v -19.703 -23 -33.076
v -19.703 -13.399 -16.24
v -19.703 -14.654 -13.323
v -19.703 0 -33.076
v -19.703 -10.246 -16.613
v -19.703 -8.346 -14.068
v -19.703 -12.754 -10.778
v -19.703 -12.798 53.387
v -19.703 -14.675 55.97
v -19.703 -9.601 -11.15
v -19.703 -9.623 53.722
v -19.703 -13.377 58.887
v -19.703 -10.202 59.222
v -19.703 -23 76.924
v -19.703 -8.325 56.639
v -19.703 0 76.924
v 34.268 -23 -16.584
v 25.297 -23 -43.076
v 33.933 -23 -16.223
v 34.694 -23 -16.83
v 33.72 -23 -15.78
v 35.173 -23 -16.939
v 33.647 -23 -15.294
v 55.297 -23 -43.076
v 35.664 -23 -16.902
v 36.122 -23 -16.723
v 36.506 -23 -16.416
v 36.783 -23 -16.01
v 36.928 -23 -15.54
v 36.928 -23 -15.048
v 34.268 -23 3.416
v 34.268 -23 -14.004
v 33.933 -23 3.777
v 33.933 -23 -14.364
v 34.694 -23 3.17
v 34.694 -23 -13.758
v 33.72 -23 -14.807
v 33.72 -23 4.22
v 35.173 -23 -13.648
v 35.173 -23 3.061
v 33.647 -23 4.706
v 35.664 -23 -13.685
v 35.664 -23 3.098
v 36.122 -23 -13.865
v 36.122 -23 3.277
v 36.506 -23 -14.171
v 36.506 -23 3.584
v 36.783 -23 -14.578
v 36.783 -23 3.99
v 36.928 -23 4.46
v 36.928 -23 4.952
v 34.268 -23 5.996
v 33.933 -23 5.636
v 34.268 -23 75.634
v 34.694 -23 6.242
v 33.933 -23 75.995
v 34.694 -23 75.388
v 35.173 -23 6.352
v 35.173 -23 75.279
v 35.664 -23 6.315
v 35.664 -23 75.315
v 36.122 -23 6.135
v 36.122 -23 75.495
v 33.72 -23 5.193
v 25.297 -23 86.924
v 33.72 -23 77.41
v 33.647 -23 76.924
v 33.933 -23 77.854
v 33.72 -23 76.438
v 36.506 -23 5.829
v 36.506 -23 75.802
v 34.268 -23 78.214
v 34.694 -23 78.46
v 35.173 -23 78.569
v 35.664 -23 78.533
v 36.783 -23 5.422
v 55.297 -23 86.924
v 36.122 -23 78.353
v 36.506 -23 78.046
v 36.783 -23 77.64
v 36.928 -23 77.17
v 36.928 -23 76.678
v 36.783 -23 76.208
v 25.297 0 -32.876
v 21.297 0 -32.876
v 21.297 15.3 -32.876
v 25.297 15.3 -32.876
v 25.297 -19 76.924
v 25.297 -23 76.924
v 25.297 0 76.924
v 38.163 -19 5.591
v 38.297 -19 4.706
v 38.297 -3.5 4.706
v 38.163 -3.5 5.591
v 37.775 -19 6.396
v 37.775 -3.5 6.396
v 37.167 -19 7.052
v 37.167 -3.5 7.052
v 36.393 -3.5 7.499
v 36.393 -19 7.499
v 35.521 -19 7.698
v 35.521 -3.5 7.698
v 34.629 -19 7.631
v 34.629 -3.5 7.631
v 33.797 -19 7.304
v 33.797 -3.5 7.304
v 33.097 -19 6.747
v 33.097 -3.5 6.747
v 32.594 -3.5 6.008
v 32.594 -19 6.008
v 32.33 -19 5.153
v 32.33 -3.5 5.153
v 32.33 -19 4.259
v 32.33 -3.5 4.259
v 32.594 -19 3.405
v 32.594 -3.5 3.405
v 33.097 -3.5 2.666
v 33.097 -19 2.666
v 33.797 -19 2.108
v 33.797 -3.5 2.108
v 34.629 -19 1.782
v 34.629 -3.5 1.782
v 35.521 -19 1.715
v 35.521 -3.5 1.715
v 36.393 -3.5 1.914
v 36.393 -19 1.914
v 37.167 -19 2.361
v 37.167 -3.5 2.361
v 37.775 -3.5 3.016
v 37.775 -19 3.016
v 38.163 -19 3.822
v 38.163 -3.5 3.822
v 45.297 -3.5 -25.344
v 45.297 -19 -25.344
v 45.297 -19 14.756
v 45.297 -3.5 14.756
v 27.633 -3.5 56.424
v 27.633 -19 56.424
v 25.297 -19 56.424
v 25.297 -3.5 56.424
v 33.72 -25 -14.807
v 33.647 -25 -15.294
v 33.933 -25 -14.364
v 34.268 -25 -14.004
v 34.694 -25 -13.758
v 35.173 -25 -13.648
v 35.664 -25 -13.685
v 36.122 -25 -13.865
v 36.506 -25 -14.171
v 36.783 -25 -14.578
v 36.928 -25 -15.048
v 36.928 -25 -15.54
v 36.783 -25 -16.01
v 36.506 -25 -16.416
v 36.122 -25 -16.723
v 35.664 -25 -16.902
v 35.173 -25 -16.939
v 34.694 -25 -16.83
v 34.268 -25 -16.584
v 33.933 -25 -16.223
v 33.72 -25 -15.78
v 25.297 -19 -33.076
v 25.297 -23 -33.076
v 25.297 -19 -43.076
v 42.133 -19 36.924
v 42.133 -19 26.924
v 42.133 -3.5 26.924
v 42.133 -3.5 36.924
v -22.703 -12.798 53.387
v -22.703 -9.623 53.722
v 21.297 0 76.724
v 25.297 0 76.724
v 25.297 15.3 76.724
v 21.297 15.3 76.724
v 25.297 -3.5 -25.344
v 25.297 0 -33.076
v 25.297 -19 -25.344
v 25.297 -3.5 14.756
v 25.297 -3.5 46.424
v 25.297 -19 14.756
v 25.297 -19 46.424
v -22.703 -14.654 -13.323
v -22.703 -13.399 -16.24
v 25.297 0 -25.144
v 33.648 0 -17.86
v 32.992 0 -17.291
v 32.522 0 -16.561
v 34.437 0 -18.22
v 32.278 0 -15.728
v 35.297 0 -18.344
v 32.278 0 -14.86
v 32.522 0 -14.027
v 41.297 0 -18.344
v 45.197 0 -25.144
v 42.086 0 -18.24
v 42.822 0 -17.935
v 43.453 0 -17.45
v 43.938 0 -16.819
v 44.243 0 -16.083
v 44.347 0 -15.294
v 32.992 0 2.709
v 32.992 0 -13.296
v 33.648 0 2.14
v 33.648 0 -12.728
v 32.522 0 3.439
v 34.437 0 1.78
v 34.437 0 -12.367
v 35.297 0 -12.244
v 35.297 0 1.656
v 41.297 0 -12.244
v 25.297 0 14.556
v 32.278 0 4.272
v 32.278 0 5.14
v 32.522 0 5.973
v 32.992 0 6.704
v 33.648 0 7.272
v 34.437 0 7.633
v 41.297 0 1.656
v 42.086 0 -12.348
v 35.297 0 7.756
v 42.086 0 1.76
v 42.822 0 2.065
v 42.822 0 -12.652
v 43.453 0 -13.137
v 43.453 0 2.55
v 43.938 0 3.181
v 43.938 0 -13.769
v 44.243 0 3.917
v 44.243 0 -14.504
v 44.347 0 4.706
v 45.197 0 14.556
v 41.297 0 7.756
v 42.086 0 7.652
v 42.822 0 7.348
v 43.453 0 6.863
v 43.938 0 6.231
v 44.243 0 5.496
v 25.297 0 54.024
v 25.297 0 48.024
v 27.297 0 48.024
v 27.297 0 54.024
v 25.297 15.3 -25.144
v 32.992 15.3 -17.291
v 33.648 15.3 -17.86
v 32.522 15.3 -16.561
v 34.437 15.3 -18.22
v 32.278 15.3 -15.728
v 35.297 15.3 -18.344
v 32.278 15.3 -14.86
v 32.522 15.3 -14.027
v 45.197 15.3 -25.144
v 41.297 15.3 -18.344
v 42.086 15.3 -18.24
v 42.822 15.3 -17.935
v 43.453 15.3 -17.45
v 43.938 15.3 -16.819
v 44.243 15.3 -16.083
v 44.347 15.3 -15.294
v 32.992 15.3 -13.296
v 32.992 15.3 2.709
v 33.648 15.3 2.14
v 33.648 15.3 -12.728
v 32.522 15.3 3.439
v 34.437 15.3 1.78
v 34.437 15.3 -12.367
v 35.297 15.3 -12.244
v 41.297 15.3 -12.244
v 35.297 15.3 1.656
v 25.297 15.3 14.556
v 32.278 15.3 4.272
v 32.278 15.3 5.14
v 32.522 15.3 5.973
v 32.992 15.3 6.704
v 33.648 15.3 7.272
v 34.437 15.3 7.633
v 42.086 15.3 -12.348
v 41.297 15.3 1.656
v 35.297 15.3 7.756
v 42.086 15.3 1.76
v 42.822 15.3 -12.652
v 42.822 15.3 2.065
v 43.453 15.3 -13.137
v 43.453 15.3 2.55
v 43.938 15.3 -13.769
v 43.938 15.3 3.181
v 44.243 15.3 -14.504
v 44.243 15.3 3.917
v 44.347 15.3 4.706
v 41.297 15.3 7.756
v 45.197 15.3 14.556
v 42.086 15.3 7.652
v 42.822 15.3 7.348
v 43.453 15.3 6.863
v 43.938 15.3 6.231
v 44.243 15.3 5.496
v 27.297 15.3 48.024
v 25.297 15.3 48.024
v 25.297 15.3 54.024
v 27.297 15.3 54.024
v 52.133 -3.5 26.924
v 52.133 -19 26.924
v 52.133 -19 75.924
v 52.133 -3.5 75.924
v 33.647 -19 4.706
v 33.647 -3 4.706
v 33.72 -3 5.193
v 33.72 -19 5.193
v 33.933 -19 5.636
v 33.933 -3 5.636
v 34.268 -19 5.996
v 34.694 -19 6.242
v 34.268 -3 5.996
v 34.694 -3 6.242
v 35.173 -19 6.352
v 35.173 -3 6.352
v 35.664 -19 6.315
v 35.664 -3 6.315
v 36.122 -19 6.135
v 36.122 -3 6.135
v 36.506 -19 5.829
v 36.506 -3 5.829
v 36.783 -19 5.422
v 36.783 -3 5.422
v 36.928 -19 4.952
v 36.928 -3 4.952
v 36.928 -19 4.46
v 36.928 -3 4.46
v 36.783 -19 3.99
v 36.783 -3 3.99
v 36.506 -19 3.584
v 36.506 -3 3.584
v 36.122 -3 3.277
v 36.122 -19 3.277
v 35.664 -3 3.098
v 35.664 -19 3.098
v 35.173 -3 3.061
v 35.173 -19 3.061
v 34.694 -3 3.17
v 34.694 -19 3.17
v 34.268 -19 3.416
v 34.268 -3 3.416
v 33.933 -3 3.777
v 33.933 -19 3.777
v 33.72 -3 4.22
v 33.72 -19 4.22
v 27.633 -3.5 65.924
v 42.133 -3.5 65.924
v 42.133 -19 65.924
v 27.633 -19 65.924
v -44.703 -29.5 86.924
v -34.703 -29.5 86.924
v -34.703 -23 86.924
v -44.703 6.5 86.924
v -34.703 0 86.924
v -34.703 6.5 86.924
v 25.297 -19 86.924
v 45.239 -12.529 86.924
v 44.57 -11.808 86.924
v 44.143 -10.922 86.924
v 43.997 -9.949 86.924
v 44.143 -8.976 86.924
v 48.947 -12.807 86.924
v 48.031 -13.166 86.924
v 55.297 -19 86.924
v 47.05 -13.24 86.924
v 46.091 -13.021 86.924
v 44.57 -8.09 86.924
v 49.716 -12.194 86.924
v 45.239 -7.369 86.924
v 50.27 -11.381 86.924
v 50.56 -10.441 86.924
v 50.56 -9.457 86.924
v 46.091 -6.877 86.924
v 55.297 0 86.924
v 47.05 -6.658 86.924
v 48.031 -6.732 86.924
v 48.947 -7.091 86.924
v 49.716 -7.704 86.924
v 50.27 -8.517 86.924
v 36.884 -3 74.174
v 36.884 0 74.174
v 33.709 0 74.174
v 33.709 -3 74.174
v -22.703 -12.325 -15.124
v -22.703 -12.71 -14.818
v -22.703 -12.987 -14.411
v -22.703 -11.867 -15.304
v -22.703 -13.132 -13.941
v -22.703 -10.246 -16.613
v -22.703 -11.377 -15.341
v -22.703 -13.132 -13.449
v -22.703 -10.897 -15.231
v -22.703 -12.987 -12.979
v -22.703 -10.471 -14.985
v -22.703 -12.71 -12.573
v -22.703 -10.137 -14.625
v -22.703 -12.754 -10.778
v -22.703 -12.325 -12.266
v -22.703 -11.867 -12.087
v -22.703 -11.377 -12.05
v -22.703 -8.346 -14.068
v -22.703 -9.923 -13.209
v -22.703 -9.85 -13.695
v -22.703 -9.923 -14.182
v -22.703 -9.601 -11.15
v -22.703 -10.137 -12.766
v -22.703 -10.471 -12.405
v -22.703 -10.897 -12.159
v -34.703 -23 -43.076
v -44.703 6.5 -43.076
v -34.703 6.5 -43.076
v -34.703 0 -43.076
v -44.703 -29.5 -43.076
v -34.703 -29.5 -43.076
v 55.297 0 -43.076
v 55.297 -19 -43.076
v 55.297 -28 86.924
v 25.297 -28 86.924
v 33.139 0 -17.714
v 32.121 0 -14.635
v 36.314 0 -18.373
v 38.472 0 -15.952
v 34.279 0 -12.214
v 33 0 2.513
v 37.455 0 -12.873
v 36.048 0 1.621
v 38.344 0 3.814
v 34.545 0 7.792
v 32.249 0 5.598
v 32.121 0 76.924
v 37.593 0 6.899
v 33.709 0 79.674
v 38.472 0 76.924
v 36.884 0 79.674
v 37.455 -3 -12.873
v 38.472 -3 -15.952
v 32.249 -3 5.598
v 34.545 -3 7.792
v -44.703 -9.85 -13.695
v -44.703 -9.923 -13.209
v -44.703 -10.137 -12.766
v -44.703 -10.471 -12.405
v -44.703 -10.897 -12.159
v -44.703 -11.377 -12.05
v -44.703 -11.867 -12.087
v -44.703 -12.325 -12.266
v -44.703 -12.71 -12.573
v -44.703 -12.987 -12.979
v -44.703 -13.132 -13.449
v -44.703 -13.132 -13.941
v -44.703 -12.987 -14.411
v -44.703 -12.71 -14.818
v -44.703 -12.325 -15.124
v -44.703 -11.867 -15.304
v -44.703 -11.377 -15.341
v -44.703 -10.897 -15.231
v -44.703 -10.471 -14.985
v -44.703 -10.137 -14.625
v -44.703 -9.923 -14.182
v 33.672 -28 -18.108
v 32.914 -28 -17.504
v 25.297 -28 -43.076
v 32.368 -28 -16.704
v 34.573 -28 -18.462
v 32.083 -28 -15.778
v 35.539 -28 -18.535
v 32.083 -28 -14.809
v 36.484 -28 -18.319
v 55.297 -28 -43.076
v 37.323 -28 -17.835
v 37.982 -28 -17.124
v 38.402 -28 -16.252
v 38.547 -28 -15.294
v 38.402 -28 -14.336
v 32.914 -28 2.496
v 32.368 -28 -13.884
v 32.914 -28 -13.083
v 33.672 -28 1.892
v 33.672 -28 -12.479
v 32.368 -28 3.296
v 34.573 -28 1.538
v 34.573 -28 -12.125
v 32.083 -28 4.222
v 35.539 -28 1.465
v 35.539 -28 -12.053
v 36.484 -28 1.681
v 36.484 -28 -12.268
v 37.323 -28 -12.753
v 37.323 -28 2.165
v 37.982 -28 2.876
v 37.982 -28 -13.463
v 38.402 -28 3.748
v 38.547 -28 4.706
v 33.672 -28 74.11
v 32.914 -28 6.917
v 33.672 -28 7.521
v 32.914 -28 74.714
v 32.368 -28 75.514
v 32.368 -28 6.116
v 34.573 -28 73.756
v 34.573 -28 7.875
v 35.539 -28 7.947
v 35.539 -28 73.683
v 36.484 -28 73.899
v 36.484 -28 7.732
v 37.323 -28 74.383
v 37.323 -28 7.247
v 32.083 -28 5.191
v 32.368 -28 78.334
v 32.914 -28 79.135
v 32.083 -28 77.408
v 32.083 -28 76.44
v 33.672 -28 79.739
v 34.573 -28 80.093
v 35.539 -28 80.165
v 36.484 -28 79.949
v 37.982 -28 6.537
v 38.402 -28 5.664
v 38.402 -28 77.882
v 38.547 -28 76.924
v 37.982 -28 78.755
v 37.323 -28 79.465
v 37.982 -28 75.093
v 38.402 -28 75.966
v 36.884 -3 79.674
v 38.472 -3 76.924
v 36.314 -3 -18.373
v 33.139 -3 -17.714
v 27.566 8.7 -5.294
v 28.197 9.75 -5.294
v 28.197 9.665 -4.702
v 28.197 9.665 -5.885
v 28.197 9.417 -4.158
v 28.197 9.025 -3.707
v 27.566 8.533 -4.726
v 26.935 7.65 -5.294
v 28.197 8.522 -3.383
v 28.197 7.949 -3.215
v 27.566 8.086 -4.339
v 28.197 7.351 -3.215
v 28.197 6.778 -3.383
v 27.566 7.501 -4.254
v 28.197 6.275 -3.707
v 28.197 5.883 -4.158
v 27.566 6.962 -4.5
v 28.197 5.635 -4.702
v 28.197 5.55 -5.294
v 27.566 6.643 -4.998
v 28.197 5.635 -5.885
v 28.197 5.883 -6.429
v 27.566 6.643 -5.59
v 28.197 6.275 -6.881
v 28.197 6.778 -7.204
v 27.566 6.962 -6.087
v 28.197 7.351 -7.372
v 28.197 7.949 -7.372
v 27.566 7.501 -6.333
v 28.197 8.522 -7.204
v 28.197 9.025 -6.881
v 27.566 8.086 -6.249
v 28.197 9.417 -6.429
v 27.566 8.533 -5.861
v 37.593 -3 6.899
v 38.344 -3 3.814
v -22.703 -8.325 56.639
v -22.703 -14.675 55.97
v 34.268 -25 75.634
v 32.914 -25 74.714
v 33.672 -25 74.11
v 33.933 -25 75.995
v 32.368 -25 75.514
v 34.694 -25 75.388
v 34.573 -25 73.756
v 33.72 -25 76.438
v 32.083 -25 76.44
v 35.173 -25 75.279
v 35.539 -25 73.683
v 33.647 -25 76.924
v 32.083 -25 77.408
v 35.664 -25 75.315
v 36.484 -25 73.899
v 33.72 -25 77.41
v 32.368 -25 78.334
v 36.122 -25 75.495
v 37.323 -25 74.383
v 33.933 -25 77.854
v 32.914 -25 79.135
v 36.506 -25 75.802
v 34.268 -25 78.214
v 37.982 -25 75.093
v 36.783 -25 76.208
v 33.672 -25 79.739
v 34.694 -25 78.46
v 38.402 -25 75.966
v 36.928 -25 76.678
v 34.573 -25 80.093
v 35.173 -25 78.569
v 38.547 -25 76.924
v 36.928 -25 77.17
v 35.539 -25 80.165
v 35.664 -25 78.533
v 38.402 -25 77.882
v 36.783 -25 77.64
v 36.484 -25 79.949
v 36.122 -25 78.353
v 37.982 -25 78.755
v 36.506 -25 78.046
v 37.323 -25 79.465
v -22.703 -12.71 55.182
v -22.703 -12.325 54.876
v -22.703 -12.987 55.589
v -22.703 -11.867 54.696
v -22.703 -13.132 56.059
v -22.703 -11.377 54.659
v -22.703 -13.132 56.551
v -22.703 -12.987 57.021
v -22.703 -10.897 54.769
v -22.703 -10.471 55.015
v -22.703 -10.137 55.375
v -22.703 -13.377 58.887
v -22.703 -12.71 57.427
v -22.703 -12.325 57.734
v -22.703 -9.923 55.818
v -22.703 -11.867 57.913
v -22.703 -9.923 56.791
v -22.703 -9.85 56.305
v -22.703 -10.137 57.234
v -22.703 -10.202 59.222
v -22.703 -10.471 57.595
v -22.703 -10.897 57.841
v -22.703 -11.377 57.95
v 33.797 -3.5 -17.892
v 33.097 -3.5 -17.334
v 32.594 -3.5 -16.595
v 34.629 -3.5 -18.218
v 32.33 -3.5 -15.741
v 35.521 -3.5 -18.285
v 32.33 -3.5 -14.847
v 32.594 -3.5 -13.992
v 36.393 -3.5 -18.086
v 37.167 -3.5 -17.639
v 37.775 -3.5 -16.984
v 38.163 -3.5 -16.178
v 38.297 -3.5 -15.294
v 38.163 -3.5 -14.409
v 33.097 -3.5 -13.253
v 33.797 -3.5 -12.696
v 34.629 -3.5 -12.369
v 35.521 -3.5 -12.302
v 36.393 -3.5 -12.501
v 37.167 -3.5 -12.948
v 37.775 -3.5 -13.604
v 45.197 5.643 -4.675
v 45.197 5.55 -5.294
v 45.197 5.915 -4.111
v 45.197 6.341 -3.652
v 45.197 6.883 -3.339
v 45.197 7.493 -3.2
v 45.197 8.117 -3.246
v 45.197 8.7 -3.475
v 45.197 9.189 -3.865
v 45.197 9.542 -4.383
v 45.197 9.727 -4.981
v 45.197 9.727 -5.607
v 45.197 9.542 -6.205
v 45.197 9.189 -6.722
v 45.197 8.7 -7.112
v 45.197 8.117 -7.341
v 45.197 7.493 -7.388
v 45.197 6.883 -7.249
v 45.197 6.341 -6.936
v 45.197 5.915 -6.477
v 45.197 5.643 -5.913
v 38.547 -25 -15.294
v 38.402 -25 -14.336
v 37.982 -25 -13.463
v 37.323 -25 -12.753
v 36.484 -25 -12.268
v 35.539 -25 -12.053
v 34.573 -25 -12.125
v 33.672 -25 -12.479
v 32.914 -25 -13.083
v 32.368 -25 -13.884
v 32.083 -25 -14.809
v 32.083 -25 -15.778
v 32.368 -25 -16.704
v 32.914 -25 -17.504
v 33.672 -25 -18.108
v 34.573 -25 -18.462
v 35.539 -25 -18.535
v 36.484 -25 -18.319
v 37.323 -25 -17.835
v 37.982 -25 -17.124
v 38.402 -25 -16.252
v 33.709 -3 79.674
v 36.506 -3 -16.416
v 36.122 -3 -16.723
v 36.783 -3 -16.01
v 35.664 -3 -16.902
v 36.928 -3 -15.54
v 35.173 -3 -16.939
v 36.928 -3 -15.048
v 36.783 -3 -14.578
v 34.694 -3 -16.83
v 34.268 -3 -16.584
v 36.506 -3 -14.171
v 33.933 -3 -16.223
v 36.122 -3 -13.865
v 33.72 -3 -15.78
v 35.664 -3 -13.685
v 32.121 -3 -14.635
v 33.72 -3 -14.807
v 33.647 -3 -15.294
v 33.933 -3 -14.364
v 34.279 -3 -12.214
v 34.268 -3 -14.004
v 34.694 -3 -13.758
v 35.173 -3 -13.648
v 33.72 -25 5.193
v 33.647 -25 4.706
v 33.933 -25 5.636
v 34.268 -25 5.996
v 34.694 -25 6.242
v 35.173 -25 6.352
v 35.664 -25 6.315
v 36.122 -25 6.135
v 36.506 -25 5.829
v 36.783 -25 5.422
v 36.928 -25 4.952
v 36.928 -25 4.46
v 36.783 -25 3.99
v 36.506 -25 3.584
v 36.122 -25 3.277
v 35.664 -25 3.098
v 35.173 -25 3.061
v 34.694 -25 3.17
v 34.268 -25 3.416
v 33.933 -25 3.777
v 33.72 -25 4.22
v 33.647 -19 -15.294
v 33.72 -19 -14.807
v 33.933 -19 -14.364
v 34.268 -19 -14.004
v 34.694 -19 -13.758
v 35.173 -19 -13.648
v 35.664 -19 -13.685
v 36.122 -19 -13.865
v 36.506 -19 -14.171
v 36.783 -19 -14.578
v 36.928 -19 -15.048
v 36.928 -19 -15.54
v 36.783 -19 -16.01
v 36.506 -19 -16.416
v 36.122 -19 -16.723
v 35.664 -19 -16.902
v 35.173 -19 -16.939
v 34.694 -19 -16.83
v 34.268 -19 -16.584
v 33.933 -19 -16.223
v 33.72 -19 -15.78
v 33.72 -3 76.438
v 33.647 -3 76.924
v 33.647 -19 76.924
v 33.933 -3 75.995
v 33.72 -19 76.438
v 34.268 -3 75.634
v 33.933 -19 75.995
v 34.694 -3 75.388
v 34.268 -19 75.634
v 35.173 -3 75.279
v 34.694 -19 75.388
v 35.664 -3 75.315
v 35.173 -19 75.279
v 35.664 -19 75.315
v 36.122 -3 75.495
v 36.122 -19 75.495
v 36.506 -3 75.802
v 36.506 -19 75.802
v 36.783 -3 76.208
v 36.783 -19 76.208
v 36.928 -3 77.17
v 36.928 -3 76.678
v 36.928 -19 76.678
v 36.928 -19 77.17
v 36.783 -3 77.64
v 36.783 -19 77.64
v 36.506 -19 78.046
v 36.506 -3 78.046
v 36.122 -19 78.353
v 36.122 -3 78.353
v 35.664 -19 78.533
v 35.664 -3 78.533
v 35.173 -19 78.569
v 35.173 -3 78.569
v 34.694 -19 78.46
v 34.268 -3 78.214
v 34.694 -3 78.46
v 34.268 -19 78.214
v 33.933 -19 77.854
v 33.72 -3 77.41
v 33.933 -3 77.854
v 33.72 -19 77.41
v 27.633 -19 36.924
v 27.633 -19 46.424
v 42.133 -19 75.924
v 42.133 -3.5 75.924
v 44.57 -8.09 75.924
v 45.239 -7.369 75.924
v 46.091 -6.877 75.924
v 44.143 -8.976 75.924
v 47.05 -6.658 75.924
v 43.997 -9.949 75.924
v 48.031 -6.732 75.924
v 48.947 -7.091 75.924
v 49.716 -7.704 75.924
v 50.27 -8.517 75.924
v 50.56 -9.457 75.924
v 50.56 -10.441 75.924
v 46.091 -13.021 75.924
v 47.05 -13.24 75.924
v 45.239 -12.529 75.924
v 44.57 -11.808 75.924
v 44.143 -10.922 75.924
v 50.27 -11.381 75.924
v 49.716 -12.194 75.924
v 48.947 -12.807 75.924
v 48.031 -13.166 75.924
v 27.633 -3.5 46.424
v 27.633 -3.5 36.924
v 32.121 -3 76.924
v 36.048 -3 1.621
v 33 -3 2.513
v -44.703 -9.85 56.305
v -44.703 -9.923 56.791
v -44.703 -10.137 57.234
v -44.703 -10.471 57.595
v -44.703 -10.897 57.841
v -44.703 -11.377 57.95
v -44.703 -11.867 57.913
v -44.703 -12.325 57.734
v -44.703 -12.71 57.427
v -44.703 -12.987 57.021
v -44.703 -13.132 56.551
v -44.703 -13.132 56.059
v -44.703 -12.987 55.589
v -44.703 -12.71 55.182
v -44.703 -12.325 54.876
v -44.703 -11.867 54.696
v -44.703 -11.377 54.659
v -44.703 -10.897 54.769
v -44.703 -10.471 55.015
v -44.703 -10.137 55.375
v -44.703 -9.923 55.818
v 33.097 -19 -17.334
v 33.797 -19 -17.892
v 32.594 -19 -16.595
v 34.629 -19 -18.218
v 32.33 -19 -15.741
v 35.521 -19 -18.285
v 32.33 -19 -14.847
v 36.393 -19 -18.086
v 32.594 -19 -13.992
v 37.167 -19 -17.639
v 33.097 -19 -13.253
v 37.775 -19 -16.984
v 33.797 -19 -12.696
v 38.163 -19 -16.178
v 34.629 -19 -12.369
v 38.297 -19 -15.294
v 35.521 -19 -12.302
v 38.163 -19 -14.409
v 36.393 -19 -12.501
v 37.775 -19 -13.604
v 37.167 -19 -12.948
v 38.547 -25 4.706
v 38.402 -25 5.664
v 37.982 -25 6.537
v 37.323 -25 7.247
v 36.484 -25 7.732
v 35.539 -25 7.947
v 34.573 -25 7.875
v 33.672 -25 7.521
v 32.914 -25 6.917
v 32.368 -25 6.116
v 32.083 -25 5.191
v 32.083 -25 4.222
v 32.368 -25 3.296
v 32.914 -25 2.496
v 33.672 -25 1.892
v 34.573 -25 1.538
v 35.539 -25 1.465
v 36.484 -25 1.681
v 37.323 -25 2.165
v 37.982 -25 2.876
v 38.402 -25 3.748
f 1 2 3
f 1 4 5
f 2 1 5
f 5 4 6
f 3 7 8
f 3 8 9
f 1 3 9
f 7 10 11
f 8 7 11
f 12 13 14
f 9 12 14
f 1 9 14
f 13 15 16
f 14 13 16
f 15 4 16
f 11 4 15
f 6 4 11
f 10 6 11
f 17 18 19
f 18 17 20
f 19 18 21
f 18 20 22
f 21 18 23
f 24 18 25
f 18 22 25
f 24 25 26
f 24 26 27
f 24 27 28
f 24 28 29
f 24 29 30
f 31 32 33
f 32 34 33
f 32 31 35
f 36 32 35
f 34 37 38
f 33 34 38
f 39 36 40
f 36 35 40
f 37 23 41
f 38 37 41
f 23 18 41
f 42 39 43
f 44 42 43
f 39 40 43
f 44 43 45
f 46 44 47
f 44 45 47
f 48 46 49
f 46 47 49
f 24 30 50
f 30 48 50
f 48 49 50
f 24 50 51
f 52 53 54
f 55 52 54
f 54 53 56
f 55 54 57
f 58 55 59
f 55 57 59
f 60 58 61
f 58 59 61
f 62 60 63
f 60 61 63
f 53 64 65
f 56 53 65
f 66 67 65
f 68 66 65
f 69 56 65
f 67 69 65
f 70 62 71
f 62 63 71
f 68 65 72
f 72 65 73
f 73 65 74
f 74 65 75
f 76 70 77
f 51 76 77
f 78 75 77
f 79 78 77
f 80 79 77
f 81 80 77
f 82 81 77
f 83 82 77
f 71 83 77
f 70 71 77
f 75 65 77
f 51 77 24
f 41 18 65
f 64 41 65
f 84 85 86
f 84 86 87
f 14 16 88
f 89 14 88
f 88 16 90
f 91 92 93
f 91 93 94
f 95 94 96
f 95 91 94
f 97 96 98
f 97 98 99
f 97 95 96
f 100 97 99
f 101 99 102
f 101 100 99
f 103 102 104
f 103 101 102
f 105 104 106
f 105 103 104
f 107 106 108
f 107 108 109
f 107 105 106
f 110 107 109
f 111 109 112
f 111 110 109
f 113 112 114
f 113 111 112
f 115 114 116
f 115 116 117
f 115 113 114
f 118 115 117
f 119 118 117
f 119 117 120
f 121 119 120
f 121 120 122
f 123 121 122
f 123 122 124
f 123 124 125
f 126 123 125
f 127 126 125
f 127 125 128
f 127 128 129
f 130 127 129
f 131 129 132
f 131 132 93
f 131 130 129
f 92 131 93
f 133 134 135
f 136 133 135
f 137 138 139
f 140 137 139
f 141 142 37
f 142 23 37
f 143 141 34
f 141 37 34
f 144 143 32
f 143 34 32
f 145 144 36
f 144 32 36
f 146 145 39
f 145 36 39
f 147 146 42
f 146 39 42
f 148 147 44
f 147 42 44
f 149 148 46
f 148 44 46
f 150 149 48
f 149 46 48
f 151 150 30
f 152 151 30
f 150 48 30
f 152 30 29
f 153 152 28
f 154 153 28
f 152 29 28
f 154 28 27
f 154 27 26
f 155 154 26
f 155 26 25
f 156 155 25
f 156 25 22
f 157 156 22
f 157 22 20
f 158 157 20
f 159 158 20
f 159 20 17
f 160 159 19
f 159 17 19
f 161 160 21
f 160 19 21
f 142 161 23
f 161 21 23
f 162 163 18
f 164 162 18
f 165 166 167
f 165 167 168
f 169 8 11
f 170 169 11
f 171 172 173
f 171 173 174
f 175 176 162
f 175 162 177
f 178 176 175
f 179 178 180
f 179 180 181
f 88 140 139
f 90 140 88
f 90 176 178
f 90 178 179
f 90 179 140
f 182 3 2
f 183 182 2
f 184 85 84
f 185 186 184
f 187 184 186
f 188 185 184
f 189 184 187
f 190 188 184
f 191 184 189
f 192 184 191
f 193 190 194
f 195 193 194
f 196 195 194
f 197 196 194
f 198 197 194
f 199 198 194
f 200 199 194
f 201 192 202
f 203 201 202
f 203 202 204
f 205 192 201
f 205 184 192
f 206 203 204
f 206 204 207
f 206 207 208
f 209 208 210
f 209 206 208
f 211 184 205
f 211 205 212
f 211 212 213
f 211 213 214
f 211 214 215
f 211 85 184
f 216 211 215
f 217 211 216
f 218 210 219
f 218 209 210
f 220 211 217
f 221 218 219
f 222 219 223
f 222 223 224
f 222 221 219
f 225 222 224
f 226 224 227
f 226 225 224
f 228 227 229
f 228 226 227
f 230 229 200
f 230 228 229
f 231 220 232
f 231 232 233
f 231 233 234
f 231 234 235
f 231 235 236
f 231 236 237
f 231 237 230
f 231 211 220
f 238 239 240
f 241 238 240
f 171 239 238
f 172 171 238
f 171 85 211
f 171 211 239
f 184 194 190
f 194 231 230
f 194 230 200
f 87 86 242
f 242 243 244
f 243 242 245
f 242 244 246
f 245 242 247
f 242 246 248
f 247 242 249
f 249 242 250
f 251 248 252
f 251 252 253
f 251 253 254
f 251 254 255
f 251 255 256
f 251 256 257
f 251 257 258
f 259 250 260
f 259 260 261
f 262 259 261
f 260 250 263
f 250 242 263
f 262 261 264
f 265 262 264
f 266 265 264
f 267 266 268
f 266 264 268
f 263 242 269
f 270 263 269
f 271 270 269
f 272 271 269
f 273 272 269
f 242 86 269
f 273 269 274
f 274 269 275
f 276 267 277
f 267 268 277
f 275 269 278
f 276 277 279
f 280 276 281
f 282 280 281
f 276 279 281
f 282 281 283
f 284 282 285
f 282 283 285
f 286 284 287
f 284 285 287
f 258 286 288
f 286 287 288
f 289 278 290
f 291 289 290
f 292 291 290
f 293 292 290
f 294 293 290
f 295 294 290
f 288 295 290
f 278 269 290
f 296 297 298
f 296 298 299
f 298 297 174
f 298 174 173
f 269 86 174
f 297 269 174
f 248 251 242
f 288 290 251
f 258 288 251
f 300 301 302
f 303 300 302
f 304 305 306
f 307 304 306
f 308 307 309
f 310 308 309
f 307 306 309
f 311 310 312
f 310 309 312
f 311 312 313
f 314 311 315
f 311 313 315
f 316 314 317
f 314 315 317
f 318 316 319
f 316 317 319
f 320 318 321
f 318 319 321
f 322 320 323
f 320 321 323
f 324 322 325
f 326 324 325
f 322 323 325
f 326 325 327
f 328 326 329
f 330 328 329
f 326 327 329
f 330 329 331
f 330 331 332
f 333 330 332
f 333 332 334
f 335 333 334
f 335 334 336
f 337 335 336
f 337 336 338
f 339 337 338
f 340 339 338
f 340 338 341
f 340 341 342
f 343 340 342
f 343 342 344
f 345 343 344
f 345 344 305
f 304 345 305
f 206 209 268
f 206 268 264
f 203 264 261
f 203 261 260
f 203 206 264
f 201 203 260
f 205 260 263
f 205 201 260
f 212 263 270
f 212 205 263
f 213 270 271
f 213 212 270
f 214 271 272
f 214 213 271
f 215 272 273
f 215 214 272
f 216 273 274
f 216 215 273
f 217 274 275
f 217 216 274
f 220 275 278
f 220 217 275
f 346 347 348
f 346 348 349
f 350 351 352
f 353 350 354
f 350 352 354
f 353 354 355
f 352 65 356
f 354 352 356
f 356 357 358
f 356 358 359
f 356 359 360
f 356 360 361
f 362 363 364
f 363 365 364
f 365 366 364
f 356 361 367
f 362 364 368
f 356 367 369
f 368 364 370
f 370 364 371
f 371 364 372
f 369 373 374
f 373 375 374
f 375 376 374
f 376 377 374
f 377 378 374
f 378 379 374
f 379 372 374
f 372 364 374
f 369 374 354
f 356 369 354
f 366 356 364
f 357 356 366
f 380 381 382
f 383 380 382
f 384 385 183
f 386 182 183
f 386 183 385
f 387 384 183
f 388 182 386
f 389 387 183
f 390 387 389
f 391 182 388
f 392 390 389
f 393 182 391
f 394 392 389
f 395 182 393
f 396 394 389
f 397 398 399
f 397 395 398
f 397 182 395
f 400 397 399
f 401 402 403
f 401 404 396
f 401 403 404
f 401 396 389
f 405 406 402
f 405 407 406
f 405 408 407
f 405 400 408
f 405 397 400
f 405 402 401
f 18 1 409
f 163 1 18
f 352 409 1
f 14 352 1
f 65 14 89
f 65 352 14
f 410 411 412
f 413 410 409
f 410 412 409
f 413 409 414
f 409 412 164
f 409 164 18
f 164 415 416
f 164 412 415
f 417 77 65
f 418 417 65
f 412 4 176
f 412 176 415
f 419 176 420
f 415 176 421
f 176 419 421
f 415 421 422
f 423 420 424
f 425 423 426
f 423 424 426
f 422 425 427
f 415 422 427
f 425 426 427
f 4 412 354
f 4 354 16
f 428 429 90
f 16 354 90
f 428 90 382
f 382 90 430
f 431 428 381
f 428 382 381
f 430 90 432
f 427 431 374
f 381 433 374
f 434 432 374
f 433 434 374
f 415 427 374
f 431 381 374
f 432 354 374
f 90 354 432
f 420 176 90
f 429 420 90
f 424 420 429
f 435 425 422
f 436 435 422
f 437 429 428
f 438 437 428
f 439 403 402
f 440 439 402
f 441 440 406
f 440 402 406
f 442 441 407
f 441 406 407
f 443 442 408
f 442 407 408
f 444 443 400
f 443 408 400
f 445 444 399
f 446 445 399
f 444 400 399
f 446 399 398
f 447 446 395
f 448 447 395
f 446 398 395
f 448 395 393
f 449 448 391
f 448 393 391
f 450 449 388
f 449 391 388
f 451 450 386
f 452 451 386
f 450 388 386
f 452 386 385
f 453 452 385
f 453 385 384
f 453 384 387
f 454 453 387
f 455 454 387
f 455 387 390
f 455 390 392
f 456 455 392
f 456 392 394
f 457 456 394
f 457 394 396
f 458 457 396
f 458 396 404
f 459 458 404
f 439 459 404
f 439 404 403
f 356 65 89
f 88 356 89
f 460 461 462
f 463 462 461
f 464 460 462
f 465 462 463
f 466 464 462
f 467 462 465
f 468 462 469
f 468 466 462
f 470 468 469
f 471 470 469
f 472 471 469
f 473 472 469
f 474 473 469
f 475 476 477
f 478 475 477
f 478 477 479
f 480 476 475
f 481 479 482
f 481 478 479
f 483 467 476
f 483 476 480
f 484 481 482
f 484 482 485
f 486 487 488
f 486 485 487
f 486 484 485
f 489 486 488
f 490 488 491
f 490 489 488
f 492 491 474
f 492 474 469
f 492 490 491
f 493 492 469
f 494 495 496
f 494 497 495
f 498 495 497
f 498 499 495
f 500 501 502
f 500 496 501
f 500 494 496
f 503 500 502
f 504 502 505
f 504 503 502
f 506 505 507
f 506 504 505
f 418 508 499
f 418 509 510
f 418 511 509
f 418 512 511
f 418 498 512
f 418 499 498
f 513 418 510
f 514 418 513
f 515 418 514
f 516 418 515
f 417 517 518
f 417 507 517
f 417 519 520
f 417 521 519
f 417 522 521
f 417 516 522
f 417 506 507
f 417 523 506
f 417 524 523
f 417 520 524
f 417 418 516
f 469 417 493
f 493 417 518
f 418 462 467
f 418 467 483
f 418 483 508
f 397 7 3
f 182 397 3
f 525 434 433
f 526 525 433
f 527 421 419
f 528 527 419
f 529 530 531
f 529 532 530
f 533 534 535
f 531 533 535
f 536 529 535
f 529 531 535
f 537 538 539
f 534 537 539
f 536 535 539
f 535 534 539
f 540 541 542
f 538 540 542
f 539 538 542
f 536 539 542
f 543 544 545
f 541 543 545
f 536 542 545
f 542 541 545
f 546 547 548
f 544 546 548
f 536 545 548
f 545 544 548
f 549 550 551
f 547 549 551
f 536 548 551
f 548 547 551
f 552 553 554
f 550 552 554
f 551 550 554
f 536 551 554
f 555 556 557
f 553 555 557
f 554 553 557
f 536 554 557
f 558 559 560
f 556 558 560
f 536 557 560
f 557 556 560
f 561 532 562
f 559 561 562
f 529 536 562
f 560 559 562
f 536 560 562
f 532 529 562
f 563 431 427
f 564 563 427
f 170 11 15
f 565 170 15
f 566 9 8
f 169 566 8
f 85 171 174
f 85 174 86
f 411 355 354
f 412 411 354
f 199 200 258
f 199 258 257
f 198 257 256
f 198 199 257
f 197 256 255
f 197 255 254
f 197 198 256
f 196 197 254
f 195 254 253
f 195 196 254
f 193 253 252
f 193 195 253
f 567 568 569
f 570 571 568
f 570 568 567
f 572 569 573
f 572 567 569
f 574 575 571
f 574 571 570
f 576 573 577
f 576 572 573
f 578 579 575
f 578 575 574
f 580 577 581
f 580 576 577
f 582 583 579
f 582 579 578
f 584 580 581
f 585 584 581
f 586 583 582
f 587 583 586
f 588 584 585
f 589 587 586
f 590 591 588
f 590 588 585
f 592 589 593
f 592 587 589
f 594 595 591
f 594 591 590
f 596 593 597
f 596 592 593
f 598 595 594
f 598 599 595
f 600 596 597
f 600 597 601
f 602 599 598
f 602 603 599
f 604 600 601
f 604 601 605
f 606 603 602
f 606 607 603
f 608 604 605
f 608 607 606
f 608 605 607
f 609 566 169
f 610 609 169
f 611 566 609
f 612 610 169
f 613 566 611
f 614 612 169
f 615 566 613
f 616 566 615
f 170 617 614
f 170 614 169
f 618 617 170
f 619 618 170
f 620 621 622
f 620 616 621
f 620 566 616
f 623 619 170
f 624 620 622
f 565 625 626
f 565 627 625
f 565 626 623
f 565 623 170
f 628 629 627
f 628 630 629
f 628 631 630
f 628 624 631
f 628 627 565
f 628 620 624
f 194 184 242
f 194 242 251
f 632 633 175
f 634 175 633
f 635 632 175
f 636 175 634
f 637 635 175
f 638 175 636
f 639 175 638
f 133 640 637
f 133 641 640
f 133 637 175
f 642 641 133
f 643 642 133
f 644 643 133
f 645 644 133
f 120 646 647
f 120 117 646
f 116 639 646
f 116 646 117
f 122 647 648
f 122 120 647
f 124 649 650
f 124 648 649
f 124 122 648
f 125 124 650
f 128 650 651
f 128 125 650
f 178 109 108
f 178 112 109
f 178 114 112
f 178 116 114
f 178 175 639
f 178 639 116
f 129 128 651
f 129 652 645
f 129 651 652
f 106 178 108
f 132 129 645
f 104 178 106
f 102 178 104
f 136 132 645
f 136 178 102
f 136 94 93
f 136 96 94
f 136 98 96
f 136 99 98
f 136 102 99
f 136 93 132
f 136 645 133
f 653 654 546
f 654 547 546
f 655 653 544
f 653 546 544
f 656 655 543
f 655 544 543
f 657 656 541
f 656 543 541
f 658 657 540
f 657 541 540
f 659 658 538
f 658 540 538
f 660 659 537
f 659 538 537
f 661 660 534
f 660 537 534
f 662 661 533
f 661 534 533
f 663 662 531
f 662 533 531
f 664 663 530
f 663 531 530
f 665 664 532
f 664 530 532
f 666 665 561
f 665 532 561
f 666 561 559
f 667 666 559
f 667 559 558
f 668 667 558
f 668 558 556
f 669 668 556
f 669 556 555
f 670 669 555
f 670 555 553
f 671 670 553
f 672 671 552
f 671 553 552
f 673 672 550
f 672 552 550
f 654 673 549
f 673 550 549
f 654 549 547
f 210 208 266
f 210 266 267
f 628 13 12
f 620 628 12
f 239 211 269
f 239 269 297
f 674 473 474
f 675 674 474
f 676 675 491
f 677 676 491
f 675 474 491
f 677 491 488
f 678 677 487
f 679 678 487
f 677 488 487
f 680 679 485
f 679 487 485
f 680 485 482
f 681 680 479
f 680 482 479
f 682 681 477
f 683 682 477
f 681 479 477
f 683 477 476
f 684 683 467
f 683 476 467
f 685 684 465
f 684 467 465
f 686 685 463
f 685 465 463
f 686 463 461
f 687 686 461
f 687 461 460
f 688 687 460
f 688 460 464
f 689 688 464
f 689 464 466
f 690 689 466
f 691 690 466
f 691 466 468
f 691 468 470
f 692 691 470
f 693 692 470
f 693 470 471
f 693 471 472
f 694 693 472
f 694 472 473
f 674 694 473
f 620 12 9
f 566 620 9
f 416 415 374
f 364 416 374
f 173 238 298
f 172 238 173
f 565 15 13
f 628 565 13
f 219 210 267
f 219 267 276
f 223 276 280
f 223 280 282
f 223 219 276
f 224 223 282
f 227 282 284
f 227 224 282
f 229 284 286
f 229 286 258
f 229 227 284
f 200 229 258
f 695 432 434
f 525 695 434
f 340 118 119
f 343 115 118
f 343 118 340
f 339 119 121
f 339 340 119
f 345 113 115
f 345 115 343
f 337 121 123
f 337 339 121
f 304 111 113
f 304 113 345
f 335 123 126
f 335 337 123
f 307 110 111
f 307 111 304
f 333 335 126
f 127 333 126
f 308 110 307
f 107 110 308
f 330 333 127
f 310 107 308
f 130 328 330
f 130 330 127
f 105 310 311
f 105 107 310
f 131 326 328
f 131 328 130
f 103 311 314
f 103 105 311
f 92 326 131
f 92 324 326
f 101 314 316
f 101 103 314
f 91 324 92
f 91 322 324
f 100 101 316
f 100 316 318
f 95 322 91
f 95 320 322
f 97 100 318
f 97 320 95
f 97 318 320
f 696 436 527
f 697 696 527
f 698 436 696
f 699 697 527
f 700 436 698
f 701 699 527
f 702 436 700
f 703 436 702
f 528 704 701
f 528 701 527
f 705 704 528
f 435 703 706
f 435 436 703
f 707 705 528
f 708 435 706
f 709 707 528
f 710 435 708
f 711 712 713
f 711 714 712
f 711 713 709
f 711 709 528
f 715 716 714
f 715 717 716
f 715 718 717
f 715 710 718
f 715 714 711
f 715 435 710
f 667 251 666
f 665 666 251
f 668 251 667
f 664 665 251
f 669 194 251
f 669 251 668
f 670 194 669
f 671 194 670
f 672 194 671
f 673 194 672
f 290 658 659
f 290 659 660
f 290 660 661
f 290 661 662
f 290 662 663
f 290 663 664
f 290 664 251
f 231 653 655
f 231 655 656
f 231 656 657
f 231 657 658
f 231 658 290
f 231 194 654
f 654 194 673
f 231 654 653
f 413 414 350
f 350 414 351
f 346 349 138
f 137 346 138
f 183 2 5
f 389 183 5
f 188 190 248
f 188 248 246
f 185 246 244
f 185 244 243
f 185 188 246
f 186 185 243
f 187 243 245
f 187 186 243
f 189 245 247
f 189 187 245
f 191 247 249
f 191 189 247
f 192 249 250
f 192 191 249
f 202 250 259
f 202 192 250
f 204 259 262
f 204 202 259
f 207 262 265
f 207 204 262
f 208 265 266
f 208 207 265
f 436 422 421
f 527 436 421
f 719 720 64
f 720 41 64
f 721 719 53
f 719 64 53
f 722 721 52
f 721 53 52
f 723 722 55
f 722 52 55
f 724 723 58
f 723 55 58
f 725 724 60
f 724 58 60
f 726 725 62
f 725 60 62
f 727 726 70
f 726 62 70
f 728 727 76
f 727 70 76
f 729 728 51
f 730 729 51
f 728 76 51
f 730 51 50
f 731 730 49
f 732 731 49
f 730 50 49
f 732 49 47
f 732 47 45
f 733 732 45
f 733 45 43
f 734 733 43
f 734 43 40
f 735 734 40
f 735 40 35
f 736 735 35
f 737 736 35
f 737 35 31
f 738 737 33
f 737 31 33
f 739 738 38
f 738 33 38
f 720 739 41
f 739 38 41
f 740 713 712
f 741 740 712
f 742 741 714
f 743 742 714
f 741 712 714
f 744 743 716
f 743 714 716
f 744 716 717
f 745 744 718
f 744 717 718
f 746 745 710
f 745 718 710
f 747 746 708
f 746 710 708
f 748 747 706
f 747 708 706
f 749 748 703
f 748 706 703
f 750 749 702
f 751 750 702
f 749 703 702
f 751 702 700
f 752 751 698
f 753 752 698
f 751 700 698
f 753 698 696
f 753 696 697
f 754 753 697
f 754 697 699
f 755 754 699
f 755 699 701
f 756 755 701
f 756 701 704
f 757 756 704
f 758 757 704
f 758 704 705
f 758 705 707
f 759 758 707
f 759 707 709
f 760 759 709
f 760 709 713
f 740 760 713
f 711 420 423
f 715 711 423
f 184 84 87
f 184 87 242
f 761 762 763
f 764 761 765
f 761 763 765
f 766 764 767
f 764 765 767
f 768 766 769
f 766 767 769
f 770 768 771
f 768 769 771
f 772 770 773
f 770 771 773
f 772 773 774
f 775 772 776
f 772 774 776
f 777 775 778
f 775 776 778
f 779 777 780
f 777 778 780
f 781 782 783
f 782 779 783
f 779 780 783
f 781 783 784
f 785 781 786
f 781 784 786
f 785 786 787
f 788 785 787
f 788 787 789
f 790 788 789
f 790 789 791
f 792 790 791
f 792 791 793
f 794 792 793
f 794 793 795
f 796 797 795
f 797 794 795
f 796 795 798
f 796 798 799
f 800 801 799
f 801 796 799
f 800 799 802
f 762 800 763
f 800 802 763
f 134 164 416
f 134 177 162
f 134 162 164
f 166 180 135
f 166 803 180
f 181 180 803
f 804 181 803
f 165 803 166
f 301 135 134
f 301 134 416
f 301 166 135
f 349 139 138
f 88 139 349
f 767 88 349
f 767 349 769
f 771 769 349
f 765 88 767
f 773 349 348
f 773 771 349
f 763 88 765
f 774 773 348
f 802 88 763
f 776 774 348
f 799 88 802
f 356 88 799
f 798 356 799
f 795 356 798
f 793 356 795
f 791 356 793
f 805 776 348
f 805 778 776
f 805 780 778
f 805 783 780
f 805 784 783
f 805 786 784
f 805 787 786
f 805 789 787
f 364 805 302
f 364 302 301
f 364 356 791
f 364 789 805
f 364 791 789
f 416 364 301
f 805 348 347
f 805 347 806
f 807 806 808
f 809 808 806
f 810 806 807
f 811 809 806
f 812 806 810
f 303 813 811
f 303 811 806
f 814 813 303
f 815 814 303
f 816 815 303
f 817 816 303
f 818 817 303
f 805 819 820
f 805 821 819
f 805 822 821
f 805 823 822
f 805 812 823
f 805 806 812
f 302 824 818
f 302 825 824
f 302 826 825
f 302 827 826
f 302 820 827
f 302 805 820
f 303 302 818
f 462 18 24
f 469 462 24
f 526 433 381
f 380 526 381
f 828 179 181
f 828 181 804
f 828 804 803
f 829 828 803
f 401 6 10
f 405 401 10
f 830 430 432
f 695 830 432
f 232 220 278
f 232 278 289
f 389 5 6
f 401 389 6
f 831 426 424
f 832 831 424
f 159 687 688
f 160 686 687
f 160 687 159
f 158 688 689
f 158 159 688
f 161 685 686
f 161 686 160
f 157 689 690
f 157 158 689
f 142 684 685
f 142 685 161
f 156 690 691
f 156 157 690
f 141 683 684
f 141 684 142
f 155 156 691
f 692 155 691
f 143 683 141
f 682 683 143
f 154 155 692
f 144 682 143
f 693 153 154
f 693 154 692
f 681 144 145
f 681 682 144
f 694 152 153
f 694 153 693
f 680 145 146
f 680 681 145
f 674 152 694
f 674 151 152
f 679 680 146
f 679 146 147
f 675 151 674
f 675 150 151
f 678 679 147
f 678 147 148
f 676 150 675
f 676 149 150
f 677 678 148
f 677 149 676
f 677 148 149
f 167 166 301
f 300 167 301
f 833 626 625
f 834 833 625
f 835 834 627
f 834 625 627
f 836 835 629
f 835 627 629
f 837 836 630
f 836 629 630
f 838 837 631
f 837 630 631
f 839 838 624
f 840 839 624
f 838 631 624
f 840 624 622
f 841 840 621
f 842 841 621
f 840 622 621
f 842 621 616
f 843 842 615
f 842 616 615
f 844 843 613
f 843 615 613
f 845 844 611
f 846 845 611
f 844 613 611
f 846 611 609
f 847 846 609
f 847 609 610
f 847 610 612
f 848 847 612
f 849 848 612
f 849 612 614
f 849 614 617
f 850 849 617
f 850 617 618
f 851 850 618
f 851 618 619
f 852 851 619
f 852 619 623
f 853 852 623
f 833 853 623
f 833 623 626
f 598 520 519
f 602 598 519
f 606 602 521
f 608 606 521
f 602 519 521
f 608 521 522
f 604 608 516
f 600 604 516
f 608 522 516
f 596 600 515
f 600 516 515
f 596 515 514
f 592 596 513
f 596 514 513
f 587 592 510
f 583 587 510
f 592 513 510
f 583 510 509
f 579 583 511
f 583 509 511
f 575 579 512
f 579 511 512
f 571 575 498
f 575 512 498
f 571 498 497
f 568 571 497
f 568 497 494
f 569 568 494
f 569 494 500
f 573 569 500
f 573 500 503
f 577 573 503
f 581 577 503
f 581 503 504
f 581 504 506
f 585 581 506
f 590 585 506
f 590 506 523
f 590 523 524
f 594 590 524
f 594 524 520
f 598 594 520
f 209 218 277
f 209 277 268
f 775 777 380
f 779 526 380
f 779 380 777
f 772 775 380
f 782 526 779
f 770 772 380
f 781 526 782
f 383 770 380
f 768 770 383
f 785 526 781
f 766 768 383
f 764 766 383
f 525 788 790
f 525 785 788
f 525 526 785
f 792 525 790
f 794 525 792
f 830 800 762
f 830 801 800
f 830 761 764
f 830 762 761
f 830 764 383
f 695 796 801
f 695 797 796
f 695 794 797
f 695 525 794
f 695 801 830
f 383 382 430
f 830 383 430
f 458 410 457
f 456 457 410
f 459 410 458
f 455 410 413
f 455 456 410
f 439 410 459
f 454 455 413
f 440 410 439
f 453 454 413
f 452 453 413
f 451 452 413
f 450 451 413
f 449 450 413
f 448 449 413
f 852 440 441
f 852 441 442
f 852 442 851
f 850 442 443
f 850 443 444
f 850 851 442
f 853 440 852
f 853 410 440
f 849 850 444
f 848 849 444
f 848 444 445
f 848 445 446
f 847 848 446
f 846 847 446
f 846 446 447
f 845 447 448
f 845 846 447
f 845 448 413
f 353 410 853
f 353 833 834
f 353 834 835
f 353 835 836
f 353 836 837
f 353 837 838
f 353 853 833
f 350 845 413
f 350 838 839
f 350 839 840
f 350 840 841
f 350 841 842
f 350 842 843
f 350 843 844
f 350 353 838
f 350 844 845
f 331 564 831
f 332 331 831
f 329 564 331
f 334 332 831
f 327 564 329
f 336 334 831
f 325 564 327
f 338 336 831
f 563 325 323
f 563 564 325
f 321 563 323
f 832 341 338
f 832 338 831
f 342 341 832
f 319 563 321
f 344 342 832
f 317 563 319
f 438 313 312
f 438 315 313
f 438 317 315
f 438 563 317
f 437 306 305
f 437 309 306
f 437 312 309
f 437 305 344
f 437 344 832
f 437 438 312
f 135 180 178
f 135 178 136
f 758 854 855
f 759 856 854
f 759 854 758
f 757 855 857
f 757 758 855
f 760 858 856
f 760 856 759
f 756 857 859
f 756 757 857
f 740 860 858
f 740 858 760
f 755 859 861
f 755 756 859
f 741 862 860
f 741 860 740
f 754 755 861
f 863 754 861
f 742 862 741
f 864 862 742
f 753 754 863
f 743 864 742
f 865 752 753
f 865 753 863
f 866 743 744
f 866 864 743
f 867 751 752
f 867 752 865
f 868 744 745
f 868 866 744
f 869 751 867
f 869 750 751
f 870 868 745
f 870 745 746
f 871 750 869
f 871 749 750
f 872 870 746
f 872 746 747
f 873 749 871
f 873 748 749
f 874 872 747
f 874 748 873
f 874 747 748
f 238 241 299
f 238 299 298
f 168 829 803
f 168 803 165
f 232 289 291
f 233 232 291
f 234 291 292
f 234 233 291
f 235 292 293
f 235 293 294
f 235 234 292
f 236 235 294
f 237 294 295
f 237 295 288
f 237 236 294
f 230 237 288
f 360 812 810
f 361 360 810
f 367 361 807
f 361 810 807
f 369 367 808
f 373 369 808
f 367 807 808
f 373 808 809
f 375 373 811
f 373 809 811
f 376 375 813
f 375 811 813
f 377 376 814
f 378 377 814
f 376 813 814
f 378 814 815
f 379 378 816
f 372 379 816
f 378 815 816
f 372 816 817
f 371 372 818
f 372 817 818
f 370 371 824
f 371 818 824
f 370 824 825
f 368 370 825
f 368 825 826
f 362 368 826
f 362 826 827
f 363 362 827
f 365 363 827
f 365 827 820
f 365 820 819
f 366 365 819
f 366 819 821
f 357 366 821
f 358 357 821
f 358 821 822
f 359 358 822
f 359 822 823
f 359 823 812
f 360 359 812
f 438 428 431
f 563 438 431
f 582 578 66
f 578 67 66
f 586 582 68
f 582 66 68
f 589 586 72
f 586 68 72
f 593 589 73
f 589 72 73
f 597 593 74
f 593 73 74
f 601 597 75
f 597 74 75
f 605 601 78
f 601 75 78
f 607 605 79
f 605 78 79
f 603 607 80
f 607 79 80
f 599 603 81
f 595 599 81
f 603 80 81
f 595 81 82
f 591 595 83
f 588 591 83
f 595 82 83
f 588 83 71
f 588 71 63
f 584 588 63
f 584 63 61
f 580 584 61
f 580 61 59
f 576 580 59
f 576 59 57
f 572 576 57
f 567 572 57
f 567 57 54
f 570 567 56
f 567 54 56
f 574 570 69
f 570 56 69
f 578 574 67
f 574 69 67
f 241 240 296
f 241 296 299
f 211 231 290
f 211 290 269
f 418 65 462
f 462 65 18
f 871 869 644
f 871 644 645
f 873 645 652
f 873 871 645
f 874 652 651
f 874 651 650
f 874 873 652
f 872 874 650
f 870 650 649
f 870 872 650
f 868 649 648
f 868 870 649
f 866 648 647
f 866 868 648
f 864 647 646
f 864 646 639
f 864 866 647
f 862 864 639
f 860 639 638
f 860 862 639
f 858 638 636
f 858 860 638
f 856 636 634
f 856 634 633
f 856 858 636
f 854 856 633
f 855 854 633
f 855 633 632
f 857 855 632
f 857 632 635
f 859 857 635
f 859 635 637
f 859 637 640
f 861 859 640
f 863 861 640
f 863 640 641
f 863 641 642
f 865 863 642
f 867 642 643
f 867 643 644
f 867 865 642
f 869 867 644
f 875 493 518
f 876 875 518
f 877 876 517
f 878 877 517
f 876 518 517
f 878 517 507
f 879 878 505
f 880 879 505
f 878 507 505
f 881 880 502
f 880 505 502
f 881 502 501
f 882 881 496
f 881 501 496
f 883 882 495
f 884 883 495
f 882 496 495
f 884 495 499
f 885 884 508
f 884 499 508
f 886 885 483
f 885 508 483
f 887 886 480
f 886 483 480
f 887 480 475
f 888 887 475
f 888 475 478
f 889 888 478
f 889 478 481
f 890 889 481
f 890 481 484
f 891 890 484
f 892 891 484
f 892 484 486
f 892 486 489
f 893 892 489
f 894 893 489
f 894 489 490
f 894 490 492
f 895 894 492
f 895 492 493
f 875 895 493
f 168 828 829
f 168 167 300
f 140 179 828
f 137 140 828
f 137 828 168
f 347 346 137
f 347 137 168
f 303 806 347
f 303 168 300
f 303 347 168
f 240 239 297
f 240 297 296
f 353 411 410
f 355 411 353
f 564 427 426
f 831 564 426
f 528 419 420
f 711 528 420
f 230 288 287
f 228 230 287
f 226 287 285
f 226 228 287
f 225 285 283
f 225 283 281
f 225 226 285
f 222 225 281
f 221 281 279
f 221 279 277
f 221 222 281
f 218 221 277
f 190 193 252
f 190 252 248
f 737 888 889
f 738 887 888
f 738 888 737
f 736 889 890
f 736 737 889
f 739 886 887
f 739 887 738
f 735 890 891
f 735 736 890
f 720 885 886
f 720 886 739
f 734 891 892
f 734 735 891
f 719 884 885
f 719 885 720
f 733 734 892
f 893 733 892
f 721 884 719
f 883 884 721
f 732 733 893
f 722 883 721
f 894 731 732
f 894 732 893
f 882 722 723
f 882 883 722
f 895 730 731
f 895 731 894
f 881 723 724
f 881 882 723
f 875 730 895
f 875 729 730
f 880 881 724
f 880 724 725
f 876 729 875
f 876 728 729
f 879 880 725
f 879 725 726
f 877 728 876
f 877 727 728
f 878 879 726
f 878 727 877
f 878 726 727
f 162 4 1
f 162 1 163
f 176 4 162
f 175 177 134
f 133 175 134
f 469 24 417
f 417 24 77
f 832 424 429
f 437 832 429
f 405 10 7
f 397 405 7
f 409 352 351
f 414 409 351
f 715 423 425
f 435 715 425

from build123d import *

# Parameters (mm, degrees)
F0_W            = 90
F0_H            = 130
F0_W_2          = 45
F0_H_2          = 110
F1_DEPTH        = 23
F2_W            = 6.5
F2_H            = 130
F2_W_2          = 23
F3_DEPTH        = 10
F5_DEPTH        = 4
F6_W            = 5.5
F6_H            = 10
F6_W_2          = 3.1640307605
F6_W_3          = 2.3359692395
F6_W_4          = 10
F6_W_5          = 20
F6_H_2          = 40.1
F6_R            = 3
F7_DEPTH        = 15.5
F9_D            = 3.3
F9_DEPTH        = 40
F9_TIP          = 0.9914200214
F10_D           = 3.3
F10_DEPTH       = 40
F10_TIP         = 0.9914200214
F12_D           = 3.3
F12_DEPTH       = 40
F12_TIP         = 0.9914200214
F14_DEPTH       = 15.3
F15_DEPTH       = 5
F17_D           = 3.3
F17_DEPTH       = 40
F17_CBORE_D     = 6.5
F17_CBORE_DEPTH = 3
F17_TIP         = 0.9914200214
F19_D           = 6.6
F19_DEPTH       = 20
F19_TIP         = 1.9828400428
F20_R           = 1.65
F21_DEPTH       = 3
F22_R           = 1.65
F23_DEPTH       = 3
F25_D           = 4.2
F25_DEPTH       = 17
F25_TIP         = 1.2618073


with BuildPart() as f1:
    # F0 (on Front) → F1 (new body)
    with BuildSketch(Plane.XZ):
        with Locations((10.2966074646, 21.924110651)):
            Rectangle(F0_W, F0_H)
        with Locations((2.7966074646, 21.924110651)):
            Rectangle(F0_W_2, F0_H_2, mode=Mode.SUBTRACT)
    extrude(amount=F1_DEPTH)

    # F2 (on face) → F3 (join)
    with BuildSketch(Plane(origin=(-34.7033925354, 0, 0), x_dir=(0, -1, 0), z_dir=(-1, 0, 0))):
        with Locations((-3.25, 21.924110651)):
            Rectangle(F2_W, F2_H)
        with Locations((11.5, 21.924110651)):
            Rectangle(F2_W_2, F2_H)
        with Locations((26.25, 21.924110651)):
            Rectangle(F2_W, F2_H)
    extrude(amount=F3_DEPTH)

    # F4 (on face) → F5 (cut)
    with BuildSketch(Plane.XZ.offset(23)):
        Polygon((55.2966074646, -43.075889349), (55.2966074646, 86.924110651), (25.2966074646, 86.924110651), (25.2966074646, 76.924110651), (25.2966074646, -33.075889349), (25.2966074646, -43.075889349), align=None)
    extrude(amount=-F5_DEPTH, mode=Mode.SUBTRACT)

    # F6 (on face) → F7 (cut)
    with BuildSketch(Plane.XZ.offset(19)):
        Polygon((42.132576704, 65.924110651), (27.632576704, 65.924110651), (27.632576704, 56.424110651), (33.132576704, 56.424110651), (33.132576704, 46.424110651), (27.632576704, 46.424110651), (27.632576704, 36.924110651), (42.132576704, 36.924110651), (52.132576704, 36.924110651), (52.132576704, 65.924110651), align=None)
        with Locations((30.382576704, 51.424110651)):
            Rectangle(F6_W, F6_H)
        with Locations((23.7145920843, 51.424110651)):
            Rectangle(F6_W_2, F6_H)
        with Locations((26.4645920843, 51.424110651)):
            Rectangle(F6_W_3, F6_H)
        with Locations((47.132576704, 70.924110651)):
            Rectangle(F6_W_4, F6_H)
        with Locations((47.132576704, 31.924110651)):
            Rectangle(F6_W_4, F6_H)
        with Locations((35.2966074646, -5.2936900675)):
            Rectangle(F6_W_5, F6_H_2)
        with Locations((35.2966074646, -15.2936900675)):
            Circle(F6_R, mode=Mode.SUBTRACT)
        with Locations((35.2966074646, 4.7063099325)):
            Circle(F6_R, mode=Mode.SUBTRACT)
    extrude(amount=-F7_DEPTH, mode=Mode.SUBTRACT)

    # F9
    with Locations(Plane.XZ.offset(19)):
        with Locations((35.2966074646, 4.7063099325), (35.2966074646, -15.2936900675)):
            Hole(F9_D / 2, depth=F9_DEPTH)
            with Locations((0, 0, -(F9_DEPTH + F9_TIP / 2))):  # 118° drill point
                Cone(0, F9_D / 2, F9_TIP, mode=Mode.SUBTRACT)

    # F10
    with Locations(Plane(origin=(0, 0, 0), x_dir=(1, 0, 0), z_dir=(0, 1, 0))):
        with Locations((35.2966074646, -76.924110651)):
            Hole(F10_D / 2, depth=F10_DEPTH)
            with Locations((0, 0, -(F10_DEPTH + F10_TIP / 2))):  # 118° drill point
                Cone(0, F10_D / 2, F10_TIP, mode=Mode.SUBTRACT)

    # F12 (one way)
    with BuildSketch(Plane.YZ.offset(-19.7033925354)):
        with Locations((-11.5, 56.3046197238), (-11.5, -13.6953802762)):
            Circle(F12_D / 2)
    extrude(amount=-F12_DEPTH, mode=Mode.SUBTRACT)
    with Locations(Plane.YZ.offset(-19.7033925354)):
        with Locations((-11.5, 56.3046197238), (-11.5, -13.6953802762)):
            with Locations((0, 0, -(F12_DEPTH + F12_TIP / 2))):  # 118° drill point
                Cone(0, F12_D / 2, F12_TIP, mode=Mode.SUBTRACT)

    # F19
    with Locations(Plane.XY.offset(86.924110651)):
        with Locations((47.2966074646, -9.9490452558)):
            Hole(F19_D / 2, depth=F19_DEPTH)
            with Locations((0, 0, -(F19_DEPTH + F19_TIP / 2))):  # 118° drill point
                Cone(0, F19_D / 2, F19_TIP, mode=Mode.SUBTRACT)

    # F20 (on face) → F21 (cut)
    with BuildSketch(Plane(origin=(0, 0, 0), x_dir=(-1, 0, 0), z_dir=(0, 1, 0))):
        Polygon((-32.2490729675, 5.5984236151), (-34.5454333283, 7.7916090671), (-37.5929678253, 6.8994953845), (-38.3441419616, 3.8141962498), (-36.0477816008, 1.6210107978), (-33.0002471038, 2.5131244805), align=None)
        with Locations((-35.2966074646, 4.7063099325)):
            Circle(F20_R, mode=Mode.SUBTRACT)
        Polygon((-32.121180984, -14.6351313678), (-34.2792227881, -12.2144107177), (-37.4546492687, -12.8729694174), (-38.4720339451, -15.9522487673), (-36.313992141, -18.3729694174), (-33.1385656604, -17.7144107177), align=None)
        with Locations((-35.2966074646, -15.2936900675)):
            Circle(F20_R, mode=Mode.SUBTRACT)
        Polygon((-36.8843207048, 74.174110651), (-33.7088942243, 74.174110651), (-32.121180984, 76.924110651), (-33.7088942243, 79.674110651), (-36.8843207048, 79.674110651), (-38.4720339451, 76.924110651), align=None)
        with Locations((-35.2966074646, 76.924110651)):
            Circle(F20_R, mode=Mode.SUBTRACT)
    extrude(amount=-F21_DEPTH, mode=Mode.SUBTRACT)

    # F22 (on face) → F23 (cut)
    with BuildSketch(Plane.YZ.offset(-19.7033925354)):
        Polygon((-9.6227224396, 53.7217997619), (-8.3245735195, 56.6389798001), (-10.2018510798, 59.2217997619), (-13.3772775604, 58.8874396856), (-14.6754264805, 55.9702596474), (-12.7981489202, 53.3874396856), align=None)
        with Locations((-11.5, 56.3046197238)):
            Circle(F22_R, mode=Mode.SUBTRACT)
        Polygon((-8.3464729724, -14.0676713177), (-9.6008229867, -11.1504912796), (-12.7543500143, -10.7782002381), (-14.6535270276, -13.3230892347), (-13.3991770133, -16.2402692729), (-10.2456499857, -16.6125603144), align=None)
        with Locations((-11.5, -13.6953802762)):
            Circle(F22_R, mode=Mode.SUBTRACT)
    extrude(amount=-F23_DEPTH, mode=Mode.SUBTRACT)


with BuildPart() as f14:
    # F13 (on Front) → F14 (new body)
    with BuildSketch(Plane.XZ):
        Polygon((25.2966074646, 54.024110651), (25.2966074646, 76.724110651), (21.2966074646, 76.724110651), (21.2966074646, 48.024110651), (21.2966074646, -32.875889349), (25.2966074646, -32.875889349), (25.2966074646, -25.1436900675), (45.1966074646, -25.1436900675), (45.1966074646, 14.5563099325), (25.2966074646, 14.5563099325), (25.2966074646, 48.024110651), (27.2966074646, 48.024110651), (27.2966074646, 54.024110651), align=None)
        with BuildLine():
            ThreePointArc((41.2966074646, -12.2436900675), (43.4532831472, -13.1370143849), (44.3466074646, -15.2936900675))
            ThreePointArc((44.3466074646, -15.2936900675), (43.4532831472, -17.4503657501), (41.2966074646, -18.3436900675))
            Line((41.2966074646, -18.3436900675), (35.2966074646, -18.3436900675))
            ThreePointArc((35.2966074646, -18.3436900675), (32.2466074646, -15.2936900675), (35.2966074646, -12.2436900675))
            Line((35.2966074646, -12.2436900675), (41.2966074646, -12.2436900675))
        make_face(mode=Mode.SUBTRACT)
        with BuildLine():
            ThreePointArc((41.2966074646, 7.7563099325), (43.4532831472, 6.8629856151), (44.3466074646, 4.7063099325))
            ThreePointArc((44.3466074646, 4.7063099325), (43.4532831472, 2.5496342499), (41.2966074646, 1.6563099325))
            Line((41.2966074646, 1.6563099325), (35.2966074646, 1.6563099325))
            ThreePointArc((35.2966074646, 1.6563099325), (32.2466074646, 4.7063099325), (35.2966074646, 7.7563099325))
            Line((35.2966074646, 7.7563099325), (41.2966074646, 7.7563099325))
        make_face(mode=Mode.SUBTRACT)
    extrude(amount=-F14_DEPTH)

    # F25
    with Locations(Plane.YZ.offset(45.1966074646)):
        with Locations((7.65, -5.2936900675)):
            Hole(F25_D / 2, depth=F25_DEPTH)
            with Locations((0, 0, -(F25_DEPTH + F25_TIP / 2))):  # 118° drill point
                Cone(0, F25_D / 2, F25_TIP, mode=Mode.SUBTRACT)


with BuildPart() as f15:
    # F4 (on face) → F15 (new body)
    with BuildSketch(Plane.XZ.offset(23)):
        Polygon((55.2966074646, -43.075889349), (55.2966074646, 86.924110651), (25.2966074646, 86.924110651), (25.2966074646, 76.924110651), (25.2966074646, -33.075889349), (25.2966074646, -43.075889349), align=None)
    extrude(amount=F15_DEPTH)

    # F17
    with Locations(Plane.XZ.offset(28)):
        with Locations((35.2966074646, 76.924110651), (35.2966074646, 4.7063099325), (35.2966074646, -15.2936900675)):
            CounterBoreHole(F17_D / 2, F17_CBORE_D / 2, F17_CBORE_DEPTH, depth=F17_DEPTH)
            with Locations((0, 0, -(F17_DEPTH + F17_TIP / 2))):  # 118° drill point
                Cone(0, F17_D / 2, F17_TIP, mode=Mode.SUBTRACT)


solid = Compound([f1.part, f14.part, f15.part])
